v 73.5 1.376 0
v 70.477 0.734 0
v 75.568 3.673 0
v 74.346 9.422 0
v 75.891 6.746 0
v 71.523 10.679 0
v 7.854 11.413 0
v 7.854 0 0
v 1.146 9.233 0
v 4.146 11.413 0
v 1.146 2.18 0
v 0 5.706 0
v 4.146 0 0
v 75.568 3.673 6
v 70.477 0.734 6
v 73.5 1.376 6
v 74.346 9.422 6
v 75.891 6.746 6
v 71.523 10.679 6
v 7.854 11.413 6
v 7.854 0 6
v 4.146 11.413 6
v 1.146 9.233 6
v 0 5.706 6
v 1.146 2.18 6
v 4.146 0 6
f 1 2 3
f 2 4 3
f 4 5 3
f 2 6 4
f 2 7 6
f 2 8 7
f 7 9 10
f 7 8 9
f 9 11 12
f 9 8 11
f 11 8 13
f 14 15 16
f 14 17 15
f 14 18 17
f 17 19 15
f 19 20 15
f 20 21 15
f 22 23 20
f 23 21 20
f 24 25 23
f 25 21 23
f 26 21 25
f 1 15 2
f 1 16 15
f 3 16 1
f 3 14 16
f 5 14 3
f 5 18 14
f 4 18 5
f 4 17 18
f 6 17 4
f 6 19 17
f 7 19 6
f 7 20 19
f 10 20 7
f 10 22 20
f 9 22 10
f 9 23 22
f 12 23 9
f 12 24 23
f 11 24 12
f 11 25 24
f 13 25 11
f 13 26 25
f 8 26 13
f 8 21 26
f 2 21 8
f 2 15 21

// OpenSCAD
$fn = 32;

// ----------------------------------------------------------------------
// Lever arm: two bosses 12 and 10 mm, 65 mm between centres
// ----------------------------------------------------------------------

// --- parameters (mm) ---
profile_height = 6;       // extrusion height
profile_points = 13;      // points of the closed outline

profile = [[0, 5.706], [1.146, 2.18], [4.146, 0], [7.854, 0], [70.477, 0.734], [73.5, 1.376], [75.568, 3.673], [75.891, 6.746], [74.346, 9.422], [71.523, 10.679], [7.854, 11.413], [4.146, 11.413], [1.146, 9.233]];  // single closed polygon, 13 points, counter clockwise

// --- the one profile operation ---
linear_extrude(height = profile_height) polygon(points = profile);
